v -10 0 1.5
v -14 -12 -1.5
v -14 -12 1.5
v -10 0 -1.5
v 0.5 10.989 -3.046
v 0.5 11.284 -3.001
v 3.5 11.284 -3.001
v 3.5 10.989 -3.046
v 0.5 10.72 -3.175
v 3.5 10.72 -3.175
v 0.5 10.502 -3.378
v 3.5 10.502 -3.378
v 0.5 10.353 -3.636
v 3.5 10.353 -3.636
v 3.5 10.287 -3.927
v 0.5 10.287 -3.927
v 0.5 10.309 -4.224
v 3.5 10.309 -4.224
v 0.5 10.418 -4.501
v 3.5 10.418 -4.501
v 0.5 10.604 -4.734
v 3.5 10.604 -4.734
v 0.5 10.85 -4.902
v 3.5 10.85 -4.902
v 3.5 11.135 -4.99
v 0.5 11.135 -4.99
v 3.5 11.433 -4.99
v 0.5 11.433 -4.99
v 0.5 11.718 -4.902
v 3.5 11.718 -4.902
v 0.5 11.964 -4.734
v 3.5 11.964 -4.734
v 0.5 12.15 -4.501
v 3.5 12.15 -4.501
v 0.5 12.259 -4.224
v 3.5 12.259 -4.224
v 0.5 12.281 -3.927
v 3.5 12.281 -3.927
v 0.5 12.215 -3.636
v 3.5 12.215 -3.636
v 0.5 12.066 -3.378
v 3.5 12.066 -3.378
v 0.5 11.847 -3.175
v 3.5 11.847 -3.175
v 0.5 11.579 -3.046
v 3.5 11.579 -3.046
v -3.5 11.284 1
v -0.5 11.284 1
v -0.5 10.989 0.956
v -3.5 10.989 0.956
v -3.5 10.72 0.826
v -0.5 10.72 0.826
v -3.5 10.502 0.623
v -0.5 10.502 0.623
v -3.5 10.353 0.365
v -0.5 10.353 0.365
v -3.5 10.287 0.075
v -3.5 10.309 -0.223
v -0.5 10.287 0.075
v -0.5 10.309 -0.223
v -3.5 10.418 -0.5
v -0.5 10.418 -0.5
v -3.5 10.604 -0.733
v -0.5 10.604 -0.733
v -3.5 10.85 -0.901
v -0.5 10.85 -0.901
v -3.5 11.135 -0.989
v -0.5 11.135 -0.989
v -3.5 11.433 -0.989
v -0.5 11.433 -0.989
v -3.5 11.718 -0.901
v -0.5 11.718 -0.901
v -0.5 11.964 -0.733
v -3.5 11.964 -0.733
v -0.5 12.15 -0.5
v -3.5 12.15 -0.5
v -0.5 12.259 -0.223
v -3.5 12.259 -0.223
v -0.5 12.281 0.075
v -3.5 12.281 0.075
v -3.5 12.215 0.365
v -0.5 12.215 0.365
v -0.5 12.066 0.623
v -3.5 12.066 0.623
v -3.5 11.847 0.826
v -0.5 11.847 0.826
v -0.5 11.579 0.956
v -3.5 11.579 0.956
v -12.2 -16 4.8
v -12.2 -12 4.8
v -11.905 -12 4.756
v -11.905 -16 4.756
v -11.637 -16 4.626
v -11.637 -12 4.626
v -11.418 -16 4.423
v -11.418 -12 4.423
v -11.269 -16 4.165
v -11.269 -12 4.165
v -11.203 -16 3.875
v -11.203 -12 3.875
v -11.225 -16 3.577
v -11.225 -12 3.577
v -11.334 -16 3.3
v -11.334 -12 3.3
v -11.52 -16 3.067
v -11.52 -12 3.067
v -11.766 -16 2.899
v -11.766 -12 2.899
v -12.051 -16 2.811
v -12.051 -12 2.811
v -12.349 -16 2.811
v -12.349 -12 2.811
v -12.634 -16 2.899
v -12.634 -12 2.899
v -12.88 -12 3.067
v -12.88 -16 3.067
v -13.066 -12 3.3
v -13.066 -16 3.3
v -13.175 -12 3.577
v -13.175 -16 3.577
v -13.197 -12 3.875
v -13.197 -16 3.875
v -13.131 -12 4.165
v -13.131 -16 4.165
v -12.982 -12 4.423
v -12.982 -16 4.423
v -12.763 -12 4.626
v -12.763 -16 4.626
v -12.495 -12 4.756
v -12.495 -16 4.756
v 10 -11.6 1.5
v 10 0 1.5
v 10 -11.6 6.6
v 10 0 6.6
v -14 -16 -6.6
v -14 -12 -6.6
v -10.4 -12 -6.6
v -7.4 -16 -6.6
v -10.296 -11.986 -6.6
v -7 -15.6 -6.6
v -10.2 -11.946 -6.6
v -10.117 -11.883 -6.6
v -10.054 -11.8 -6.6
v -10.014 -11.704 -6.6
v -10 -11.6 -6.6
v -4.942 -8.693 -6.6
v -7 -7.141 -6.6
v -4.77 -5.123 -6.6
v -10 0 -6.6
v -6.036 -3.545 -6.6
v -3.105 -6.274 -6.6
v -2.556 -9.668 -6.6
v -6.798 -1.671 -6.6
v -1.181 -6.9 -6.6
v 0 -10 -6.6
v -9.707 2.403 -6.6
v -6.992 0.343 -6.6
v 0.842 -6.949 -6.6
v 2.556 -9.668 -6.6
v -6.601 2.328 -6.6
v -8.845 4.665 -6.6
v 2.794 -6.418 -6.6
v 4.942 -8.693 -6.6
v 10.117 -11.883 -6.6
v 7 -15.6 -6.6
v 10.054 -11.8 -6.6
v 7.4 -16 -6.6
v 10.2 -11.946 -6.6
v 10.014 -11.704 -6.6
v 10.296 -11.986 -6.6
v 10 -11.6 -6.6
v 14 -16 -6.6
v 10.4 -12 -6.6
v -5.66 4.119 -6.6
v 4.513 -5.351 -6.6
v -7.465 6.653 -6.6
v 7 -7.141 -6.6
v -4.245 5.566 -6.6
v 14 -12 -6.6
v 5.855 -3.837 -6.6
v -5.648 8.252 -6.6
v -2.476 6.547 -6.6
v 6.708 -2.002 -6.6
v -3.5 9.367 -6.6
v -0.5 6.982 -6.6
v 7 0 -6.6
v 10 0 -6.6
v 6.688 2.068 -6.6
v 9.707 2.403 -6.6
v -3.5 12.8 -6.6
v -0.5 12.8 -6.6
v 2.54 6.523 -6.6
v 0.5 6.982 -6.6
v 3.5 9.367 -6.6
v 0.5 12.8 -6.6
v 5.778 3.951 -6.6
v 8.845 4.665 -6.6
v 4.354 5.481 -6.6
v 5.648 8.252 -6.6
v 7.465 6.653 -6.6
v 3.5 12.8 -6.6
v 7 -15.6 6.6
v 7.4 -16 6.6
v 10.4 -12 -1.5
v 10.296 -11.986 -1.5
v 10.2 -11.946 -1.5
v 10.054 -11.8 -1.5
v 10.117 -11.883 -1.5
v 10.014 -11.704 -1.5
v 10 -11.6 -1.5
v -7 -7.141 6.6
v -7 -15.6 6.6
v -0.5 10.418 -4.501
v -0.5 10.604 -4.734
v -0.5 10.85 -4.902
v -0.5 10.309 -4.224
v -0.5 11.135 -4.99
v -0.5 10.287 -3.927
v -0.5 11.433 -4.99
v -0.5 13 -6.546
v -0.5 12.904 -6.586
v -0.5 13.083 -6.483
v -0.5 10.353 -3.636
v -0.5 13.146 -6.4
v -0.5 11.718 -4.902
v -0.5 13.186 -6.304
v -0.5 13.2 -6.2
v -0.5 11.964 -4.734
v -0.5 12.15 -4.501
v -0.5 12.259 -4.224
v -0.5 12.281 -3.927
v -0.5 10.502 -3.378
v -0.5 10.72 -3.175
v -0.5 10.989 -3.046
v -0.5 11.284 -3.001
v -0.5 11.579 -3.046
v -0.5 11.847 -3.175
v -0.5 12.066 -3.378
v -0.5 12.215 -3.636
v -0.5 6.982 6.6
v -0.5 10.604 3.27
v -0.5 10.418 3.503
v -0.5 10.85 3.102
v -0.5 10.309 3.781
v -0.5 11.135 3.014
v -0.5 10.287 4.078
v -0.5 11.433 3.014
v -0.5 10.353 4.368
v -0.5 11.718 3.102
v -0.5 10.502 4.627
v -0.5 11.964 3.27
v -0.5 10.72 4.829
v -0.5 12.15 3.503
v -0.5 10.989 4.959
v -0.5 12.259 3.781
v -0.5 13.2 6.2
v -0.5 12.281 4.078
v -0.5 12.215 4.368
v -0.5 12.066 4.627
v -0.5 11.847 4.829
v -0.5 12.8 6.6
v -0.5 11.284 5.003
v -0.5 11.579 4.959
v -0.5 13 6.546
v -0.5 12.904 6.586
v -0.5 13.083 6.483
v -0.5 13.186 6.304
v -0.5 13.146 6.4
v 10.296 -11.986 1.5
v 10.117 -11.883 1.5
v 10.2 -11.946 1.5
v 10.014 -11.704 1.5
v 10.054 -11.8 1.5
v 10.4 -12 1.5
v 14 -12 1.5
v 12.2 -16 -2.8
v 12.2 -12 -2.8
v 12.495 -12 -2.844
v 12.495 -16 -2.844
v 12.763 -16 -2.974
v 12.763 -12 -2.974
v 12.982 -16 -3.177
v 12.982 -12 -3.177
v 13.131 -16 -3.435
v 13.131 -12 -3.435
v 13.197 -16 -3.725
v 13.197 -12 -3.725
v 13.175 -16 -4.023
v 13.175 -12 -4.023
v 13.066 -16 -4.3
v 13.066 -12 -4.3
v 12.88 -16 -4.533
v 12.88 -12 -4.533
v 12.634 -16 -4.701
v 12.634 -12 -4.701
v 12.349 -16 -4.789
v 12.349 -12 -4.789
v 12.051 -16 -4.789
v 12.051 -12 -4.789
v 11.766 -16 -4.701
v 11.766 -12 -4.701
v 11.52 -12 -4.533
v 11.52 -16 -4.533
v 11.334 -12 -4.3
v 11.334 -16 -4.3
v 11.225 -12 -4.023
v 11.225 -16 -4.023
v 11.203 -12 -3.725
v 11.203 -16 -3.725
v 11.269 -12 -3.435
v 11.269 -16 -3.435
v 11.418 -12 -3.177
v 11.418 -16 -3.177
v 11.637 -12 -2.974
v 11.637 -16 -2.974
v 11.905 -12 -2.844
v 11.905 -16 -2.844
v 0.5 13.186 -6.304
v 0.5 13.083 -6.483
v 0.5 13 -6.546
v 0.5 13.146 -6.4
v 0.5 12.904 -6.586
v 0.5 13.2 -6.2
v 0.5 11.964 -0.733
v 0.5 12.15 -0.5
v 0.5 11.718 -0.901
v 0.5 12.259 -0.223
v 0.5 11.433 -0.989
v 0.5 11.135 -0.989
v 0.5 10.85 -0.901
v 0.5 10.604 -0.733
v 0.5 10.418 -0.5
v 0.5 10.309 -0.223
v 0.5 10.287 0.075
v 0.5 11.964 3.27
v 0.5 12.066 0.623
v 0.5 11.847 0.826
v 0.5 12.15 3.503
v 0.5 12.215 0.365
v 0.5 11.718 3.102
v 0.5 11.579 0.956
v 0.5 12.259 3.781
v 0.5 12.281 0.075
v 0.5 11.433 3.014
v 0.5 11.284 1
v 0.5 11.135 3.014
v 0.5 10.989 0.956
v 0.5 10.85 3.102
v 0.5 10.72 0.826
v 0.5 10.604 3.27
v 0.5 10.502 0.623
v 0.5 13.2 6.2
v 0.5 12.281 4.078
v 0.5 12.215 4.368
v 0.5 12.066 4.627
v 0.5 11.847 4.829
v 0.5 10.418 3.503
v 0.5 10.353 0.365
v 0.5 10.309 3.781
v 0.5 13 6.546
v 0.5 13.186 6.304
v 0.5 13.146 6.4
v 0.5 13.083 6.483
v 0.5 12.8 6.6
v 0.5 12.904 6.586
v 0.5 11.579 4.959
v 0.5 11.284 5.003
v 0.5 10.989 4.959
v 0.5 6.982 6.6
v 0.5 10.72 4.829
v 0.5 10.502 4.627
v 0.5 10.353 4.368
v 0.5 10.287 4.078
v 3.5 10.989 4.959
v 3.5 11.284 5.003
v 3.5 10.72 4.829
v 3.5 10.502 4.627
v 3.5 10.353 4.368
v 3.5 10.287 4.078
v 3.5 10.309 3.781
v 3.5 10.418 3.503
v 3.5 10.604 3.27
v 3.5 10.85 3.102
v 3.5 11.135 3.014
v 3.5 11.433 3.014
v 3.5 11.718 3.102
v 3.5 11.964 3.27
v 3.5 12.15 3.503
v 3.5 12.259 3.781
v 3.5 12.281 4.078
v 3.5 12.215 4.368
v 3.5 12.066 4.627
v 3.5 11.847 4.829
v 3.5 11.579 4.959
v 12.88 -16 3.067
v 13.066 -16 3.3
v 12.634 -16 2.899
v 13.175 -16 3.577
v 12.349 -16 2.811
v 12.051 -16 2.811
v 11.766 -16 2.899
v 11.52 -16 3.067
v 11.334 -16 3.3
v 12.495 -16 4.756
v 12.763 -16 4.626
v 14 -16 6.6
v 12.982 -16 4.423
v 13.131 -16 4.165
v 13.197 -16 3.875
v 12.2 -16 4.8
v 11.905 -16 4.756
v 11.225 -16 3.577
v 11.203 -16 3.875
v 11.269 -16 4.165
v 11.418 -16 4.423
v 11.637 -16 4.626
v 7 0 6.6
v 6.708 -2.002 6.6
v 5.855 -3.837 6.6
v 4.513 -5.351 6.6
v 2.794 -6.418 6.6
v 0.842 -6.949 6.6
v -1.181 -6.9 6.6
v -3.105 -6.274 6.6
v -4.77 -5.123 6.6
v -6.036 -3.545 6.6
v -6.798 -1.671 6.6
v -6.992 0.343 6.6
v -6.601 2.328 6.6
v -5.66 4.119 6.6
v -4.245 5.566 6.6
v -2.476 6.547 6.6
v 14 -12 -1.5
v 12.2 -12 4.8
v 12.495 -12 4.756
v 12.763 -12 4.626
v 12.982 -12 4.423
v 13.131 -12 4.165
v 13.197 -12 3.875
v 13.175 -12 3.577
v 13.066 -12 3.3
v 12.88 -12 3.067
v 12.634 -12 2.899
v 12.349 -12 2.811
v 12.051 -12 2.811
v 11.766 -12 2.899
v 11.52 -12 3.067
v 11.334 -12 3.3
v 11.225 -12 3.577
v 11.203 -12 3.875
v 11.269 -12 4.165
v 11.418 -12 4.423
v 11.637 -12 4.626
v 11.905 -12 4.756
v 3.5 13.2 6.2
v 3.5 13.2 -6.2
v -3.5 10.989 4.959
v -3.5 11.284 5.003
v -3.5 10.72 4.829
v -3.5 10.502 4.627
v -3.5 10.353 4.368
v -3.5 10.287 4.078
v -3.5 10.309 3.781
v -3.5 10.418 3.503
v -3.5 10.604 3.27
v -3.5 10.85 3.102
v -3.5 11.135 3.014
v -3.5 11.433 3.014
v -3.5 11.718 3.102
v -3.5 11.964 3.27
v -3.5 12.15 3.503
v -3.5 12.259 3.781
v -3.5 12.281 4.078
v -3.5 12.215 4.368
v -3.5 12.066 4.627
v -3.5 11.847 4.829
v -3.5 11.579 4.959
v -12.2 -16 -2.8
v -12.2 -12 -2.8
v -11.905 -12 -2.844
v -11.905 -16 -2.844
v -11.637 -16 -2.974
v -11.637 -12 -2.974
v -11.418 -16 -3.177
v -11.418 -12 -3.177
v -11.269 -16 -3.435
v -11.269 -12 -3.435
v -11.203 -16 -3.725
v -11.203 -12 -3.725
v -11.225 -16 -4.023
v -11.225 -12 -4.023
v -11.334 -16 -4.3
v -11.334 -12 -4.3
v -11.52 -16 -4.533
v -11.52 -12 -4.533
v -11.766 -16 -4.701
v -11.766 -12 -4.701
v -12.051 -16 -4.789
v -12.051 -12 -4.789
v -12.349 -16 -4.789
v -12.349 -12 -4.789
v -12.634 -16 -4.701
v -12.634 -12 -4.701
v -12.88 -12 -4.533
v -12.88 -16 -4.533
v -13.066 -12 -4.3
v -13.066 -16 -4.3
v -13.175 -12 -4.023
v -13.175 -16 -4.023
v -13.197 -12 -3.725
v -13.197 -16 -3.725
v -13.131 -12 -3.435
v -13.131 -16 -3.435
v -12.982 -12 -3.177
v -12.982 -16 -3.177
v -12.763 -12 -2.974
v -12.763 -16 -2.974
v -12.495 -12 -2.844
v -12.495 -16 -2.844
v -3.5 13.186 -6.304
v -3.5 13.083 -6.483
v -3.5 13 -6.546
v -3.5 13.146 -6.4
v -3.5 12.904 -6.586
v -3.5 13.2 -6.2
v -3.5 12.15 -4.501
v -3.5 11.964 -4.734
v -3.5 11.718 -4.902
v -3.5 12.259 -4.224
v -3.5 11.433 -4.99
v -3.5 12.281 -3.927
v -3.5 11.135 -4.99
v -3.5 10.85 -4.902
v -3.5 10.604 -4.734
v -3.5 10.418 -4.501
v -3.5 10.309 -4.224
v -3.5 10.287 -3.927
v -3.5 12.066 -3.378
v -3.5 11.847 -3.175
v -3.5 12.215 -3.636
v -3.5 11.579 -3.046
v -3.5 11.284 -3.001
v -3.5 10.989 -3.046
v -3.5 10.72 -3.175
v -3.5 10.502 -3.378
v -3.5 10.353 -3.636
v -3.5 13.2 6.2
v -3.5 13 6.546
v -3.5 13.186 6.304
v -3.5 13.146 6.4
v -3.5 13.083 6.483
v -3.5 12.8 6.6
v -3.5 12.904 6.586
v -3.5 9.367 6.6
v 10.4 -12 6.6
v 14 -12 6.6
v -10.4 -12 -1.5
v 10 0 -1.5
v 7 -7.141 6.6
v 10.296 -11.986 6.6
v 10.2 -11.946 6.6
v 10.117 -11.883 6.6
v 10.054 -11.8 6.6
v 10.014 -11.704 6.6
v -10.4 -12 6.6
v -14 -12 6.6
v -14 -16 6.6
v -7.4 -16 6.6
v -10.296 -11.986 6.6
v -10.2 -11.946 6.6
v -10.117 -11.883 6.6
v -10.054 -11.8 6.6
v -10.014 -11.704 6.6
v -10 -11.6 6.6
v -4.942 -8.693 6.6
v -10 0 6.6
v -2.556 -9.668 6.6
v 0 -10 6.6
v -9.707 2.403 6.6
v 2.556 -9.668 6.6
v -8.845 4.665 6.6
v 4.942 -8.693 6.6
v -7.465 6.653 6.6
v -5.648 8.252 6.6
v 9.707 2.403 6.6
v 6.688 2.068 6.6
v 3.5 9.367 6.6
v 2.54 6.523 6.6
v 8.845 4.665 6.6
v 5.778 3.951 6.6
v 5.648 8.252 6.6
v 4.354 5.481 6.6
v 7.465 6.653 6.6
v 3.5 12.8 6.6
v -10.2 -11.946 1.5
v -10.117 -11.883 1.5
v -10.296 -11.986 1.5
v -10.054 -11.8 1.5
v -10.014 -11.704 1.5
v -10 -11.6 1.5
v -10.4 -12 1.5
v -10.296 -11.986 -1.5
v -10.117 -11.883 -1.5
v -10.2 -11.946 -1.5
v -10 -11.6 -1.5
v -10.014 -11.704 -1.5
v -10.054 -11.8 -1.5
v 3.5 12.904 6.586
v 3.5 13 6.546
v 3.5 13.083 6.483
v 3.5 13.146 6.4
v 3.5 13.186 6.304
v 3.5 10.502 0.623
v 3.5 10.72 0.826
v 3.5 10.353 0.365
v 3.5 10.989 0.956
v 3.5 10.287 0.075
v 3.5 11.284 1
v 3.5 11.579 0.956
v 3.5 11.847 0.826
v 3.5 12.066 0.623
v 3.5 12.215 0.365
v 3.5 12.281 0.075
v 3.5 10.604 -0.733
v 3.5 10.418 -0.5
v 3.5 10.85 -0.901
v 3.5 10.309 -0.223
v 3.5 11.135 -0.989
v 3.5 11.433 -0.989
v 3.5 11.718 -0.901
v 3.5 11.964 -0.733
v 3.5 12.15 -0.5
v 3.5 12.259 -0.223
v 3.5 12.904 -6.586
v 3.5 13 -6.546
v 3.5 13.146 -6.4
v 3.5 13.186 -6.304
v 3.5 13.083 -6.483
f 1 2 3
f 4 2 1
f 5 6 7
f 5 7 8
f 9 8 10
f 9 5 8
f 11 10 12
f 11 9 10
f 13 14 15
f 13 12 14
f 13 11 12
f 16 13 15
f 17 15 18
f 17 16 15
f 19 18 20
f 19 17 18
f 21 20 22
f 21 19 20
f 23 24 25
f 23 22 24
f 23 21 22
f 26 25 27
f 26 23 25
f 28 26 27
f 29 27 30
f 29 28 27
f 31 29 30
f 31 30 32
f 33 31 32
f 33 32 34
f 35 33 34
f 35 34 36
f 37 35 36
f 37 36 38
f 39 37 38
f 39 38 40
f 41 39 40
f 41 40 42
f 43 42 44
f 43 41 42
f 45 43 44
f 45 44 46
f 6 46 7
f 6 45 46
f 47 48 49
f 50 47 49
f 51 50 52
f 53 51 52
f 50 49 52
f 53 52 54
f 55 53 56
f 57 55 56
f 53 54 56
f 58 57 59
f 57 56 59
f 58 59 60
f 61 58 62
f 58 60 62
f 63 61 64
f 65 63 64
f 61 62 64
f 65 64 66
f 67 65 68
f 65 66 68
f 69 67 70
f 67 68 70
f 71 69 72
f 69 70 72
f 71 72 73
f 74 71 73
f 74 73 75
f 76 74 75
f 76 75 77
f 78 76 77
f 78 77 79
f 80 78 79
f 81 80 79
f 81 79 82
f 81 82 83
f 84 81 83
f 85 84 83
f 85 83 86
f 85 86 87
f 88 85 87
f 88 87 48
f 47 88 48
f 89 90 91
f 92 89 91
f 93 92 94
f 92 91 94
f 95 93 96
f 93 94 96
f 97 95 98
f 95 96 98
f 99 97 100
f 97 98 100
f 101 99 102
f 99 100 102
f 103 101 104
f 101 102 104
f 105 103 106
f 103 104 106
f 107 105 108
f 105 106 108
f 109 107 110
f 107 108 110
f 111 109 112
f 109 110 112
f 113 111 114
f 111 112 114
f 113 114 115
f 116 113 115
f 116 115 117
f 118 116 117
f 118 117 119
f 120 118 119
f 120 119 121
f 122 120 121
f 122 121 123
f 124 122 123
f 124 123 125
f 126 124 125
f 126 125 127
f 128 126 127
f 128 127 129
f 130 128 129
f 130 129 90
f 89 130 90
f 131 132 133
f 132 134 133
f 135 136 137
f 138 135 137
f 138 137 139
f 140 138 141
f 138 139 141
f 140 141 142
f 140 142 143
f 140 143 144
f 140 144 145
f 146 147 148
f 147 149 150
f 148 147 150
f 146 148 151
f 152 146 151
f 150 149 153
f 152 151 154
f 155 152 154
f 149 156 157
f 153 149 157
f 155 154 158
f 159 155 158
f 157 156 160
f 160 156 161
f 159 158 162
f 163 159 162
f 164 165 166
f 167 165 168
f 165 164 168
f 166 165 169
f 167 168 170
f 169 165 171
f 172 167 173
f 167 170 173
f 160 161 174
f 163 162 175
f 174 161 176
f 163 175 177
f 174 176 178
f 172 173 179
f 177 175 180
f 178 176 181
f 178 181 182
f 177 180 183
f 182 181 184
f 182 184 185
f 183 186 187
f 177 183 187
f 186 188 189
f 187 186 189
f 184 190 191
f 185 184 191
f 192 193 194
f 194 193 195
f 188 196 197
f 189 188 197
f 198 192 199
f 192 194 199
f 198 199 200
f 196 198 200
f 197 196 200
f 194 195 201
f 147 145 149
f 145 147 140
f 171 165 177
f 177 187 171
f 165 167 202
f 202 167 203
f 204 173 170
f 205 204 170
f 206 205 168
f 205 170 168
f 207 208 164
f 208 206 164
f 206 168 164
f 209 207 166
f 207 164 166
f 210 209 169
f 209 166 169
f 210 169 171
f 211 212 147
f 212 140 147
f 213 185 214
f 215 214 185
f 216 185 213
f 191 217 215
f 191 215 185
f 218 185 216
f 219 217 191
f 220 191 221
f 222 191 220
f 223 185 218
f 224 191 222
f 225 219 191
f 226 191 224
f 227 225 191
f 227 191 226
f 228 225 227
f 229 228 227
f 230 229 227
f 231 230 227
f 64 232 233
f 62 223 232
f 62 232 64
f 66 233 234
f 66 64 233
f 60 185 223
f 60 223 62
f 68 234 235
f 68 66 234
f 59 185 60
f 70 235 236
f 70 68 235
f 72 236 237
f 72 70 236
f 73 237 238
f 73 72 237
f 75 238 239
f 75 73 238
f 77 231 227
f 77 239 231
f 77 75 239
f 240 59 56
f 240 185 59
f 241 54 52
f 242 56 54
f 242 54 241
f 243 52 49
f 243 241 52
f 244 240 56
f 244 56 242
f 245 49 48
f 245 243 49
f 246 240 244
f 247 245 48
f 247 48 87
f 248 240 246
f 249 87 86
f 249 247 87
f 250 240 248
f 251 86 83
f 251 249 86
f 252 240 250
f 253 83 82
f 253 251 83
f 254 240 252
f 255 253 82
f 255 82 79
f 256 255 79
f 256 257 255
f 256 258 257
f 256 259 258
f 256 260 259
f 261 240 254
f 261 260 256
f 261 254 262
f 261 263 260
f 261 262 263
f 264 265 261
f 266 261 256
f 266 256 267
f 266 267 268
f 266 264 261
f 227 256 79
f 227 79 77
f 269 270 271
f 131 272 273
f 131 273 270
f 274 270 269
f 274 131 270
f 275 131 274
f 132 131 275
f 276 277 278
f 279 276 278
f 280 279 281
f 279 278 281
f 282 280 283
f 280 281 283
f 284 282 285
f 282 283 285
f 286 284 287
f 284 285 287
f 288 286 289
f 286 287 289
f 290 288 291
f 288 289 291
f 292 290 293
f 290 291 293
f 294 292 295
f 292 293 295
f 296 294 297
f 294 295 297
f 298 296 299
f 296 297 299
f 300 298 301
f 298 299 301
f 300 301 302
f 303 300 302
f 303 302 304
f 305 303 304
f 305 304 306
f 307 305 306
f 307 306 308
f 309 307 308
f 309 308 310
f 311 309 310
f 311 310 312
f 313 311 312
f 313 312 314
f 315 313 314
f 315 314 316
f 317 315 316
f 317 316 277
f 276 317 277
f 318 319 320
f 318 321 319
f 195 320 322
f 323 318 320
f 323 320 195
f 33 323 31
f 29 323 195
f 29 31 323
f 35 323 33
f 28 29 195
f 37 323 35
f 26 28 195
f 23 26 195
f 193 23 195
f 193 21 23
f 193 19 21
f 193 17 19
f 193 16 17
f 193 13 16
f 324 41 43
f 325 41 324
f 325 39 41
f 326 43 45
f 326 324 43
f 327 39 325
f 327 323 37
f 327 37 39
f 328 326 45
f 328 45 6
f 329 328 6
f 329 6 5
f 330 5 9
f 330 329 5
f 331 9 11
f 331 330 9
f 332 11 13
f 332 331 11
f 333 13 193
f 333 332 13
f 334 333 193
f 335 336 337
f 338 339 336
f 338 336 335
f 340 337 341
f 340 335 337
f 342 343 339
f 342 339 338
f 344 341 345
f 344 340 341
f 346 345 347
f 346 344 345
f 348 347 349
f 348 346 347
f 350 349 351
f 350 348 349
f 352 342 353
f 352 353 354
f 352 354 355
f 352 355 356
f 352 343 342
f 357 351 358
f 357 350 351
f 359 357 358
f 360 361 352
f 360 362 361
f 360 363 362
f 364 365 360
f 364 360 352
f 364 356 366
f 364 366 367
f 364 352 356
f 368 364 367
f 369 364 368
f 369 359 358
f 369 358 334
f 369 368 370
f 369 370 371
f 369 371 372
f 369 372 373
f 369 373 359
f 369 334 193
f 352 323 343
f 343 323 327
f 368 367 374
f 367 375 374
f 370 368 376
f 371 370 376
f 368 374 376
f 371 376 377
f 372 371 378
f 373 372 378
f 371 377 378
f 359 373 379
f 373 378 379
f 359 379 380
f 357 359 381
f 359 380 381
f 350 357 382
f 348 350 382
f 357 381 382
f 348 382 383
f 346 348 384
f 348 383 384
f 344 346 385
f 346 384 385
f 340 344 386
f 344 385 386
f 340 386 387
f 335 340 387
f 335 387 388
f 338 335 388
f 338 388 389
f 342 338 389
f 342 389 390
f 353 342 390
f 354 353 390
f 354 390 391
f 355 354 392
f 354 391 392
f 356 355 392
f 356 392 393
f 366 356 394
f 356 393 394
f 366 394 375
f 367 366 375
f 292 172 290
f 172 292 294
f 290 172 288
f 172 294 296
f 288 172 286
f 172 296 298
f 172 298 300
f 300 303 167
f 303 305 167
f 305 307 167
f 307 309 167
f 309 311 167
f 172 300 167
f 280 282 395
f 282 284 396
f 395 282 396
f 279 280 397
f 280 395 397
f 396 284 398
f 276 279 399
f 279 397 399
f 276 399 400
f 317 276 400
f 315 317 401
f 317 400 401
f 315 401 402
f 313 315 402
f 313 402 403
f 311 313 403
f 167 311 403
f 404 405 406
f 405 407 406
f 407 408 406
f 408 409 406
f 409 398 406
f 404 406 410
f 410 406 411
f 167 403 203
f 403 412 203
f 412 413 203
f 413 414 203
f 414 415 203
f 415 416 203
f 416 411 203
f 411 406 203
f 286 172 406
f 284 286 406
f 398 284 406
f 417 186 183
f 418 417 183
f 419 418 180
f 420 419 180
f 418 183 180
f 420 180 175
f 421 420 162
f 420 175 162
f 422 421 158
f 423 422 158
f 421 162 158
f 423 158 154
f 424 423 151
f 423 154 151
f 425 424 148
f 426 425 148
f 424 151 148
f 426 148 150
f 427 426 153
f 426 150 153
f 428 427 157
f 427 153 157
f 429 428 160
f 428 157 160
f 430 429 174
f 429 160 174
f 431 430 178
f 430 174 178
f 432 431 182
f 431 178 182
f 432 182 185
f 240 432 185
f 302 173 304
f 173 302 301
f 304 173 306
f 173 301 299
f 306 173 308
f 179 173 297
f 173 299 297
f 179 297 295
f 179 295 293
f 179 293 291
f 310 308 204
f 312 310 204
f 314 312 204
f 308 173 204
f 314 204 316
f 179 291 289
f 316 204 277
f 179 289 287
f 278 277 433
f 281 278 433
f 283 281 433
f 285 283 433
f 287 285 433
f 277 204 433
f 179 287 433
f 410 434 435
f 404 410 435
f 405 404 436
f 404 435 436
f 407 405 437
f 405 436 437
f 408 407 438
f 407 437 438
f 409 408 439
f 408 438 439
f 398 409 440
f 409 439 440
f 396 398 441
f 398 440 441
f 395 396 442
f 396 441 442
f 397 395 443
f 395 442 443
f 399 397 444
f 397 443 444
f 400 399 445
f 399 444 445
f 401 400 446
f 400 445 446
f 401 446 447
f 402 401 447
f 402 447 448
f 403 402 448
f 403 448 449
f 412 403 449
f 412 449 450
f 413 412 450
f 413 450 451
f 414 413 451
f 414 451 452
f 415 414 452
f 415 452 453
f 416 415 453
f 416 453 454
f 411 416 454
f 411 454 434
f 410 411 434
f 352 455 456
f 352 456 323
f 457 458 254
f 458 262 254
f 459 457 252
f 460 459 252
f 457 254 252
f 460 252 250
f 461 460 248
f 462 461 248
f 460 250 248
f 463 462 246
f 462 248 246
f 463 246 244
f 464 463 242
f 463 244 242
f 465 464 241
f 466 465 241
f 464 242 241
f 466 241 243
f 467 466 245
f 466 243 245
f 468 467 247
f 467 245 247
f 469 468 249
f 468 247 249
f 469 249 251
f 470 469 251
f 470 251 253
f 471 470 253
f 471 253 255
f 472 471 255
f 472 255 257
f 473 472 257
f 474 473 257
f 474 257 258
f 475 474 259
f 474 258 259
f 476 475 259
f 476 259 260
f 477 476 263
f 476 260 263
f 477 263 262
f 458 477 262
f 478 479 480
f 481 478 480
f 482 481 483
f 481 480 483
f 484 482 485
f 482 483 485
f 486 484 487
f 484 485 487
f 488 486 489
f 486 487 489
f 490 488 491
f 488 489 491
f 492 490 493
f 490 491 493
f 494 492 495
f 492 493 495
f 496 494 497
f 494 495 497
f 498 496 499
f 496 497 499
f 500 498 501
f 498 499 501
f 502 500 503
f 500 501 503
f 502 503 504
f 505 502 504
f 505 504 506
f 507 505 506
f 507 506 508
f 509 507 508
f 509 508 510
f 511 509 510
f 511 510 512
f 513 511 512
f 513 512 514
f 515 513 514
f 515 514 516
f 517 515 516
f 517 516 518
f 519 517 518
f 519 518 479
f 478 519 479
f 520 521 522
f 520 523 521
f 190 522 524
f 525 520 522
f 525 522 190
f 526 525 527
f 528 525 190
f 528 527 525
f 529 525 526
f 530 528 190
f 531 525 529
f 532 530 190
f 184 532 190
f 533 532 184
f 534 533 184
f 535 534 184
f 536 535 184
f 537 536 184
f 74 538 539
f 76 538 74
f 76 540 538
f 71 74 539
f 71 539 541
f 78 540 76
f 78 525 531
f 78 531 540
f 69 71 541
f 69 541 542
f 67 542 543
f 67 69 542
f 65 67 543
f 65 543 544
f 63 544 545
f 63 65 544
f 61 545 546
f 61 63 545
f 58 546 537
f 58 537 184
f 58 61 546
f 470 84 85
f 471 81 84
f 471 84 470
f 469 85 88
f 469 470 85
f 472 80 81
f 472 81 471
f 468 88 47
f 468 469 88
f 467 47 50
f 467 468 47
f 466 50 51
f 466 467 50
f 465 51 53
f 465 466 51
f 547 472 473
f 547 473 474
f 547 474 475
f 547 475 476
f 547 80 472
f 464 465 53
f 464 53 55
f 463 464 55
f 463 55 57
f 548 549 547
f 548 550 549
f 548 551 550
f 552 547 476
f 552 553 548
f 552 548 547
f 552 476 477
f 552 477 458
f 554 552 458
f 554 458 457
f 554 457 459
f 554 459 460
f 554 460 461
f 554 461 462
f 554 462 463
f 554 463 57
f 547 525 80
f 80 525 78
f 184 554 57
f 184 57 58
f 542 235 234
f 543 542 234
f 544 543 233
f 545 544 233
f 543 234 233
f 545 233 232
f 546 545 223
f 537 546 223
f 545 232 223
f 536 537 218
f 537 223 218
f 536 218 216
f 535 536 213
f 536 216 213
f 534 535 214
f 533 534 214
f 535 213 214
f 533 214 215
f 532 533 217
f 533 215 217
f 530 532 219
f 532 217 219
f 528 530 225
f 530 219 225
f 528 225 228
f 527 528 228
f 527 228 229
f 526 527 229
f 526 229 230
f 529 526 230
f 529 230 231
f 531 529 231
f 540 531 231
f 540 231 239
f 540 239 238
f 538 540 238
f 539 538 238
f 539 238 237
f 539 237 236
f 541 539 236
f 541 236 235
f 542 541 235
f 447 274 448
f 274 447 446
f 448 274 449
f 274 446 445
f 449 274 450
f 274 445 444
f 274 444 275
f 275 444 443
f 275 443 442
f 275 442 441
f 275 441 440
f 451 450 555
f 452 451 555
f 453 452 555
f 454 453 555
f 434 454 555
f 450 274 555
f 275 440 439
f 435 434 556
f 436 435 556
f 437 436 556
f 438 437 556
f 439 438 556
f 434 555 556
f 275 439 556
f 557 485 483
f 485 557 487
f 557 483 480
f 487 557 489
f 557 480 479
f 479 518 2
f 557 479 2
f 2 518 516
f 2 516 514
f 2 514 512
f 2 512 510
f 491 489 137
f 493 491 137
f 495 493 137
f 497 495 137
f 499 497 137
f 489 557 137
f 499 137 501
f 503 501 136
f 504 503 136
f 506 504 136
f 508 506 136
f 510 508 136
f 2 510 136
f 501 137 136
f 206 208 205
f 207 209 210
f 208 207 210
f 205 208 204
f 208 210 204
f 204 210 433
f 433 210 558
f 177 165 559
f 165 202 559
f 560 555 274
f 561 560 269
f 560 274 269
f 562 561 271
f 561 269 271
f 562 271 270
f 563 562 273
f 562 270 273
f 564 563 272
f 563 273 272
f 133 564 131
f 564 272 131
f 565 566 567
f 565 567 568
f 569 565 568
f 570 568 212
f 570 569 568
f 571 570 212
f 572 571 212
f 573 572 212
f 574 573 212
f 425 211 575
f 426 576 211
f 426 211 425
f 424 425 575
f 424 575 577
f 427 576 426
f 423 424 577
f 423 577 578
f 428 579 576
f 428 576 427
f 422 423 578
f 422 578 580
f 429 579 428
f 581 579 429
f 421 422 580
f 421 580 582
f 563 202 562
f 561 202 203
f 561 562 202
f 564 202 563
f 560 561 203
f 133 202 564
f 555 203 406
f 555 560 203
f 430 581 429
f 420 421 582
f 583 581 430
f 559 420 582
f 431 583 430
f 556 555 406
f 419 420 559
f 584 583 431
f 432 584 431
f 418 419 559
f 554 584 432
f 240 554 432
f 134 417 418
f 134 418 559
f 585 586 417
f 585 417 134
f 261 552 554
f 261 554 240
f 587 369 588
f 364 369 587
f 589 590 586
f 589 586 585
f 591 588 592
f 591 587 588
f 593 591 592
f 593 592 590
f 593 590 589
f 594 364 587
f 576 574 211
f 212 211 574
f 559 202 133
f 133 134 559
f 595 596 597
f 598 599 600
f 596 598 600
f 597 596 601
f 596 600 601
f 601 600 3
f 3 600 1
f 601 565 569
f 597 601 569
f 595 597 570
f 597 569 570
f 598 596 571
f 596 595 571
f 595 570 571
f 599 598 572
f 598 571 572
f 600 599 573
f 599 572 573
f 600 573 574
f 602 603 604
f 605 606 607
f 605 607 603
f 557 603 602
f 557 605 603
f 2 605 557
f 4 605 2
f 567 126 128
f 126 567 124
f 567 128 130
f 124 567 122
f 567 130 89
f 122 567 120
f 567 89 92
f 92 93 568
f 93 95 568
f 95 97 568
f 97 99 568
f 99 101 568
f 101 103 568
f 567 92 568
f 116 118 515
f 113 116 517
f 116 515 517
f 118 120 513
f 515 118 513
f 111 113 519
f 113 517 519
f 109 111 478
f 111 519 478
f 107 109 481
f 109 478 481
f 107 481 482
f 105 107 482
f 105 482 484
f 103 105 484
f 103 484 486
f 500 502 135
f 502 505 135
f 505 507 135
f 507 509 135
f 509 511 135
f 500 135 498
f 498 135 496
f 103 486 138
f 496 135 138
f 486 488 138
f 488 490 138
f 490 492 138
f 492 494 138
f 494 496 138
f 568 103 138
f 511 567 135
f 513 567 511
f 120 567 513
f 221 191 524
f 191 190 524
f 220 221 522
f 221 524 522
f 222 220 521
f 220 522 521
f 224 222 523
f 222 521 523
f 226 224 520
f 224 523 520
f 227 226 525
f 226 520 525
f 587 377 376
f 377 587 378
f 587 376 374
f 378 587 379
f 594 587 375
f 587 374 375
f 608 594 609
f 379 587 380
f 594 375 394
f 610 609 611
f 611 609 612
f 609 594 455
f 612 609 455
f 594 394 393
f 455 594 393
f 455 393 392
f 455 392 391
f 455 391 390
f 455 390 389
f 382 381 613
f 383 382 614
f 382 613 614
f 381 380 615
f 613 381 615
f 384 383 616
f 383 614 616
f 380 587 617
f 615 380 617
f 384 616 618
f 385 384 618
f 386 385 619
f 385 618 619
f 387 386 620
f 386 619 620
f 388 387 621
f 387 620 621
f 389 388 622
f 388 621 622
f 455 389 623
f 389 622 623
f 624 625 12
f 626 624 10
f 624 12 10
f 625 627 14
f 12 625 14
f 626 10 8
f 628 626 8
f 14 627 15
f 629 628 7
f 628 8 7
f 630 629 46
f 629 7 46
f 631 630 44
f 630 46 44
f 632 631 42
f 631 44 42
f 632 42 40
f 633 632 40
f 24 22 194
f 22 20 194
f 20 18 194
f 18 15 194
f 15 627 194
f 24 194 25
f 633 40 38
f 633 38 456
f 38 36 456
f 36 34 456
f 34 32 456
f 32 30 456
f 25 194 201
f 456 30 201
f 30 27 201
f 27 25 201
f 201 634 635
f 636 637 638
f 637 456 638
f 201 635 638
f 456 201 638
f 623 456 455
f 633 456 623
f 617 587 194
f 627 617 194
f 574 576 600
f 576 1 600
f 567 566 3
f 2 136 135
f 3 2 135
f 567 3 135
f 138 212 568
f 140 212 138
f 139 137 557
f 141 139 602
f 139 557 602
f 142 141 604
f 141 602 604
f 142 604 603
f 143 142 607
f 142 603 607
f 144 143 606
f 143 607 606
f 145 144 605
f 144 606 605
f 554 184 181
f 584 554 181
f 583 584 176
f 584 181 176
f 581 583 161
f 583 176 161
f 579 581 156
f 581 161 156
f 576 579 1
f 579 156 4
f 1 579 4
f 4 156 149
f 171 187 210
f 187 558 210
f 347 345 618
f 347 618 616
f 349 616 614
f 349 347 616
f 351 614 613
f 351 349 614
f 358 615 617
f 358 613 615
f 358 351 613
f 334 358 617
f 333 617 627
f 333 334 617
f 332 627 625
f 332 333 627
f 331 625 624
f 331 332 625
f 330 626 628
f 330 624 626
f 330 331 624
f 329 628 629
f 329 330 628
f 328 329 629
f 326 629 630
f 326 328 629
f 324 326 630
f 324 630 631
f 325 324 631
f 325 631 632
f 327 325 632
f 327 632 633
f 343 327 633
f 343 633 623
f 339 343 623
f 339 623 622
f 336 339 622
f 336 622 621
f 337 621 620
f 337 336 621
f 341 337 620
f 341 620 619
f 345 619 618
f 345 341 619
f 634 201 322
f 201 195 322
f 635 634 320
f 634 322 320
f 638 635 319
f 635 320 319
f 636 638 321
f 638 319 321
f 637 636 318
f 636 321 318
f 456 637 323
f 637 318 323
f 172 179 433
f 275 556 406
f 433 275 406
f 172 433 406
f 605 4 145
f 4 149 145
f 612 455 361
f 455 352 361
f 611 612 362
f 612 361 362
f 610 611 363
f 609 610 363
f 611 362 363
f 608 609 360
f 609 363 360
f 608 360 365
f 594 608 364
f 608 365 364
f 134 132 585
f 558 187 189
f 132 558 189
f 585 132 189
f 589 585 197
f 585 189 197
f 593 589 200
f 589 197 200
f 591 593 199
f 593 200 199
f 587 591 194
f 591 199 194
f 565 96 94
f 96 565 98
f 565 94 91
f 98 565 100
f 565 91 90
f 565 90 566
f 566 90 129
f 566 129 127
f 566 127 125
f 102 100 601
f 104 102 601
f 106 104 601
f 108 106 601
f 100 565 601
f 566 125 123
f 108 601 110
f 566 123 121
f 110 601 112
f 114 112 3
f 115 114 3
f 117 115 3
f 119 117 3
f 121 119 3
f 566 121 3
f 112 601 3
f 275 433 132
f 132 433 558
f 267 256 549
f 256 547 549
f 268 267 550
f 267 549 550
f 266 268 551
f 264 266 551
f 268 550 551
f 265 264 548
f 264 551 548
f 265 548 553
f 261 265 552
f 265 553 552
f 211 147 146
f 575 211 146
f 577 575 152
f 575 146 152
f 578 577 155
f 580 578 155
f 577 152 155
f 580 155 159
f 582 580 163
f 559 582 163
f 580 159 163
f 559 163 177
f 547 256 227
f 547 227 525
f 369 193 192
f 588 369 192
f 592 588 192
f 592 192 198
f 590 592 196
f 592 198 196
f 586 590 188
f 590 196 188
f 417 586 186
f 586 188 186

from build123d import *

# Parameters (mm, degrees)
BOSS_EXTRUDE1_DEPTH = 6.6
SKETCH3_R           = 1
CUT_EXTRUDE1_DEPTH  = 6.6
BOSS_EXTRUDE2_DEPTH = 6.6
CHAMFER1_SIZE       = 0.4
FILLET1_R           = 0.4
FILLET2_R           = 0.4
RIB17_START         = -1.5
RIB17_DEPTH         = 3
SKETCH25_R          = 1
CUT_EXTRUDE2_DEPTH  = 13.2


# Read off the part's stored shape, not the designer's step: Rib17
with BuildPart() as part:
    # Sketch1 → Boss-Extrude1 (new, symmetric)
    with BuildSketch(Plane.XY):
        with BuildLine():
            Line((-0.5, 13.2), (-3.5, 13.2))
            Line((-3.5, 13.2), (-3.5, 9.367496998))
            ThreePointArc((-3.5, 9.367496998), (0, -10), (3.5, 9.367496998))
            Line((3.5, 9.367496998), (3.5, 13.2))
            Line((3.5, 13.2), (0.5, 13.2))
            Line((0.5, 13.2), (0.5, 6.982120022))
            ThreePointArc((0.5, 6.982120022), (5.123475383, 4.769696007), (7, 0))
            ThreePointArc((7, 0), (-4.769696007, -5.123475383), (-0.5, 6.982120022))
            Line((-0.5, 6.982120022), (-0.5, 13.2))
        make_face()
    extrude(amount=BOSS_EXTRUDE1_DEPTH, both=True)

    # Sketch3 → Cut-Extrude1 (cut, symmetric)
    with BuildSketch(Plane(origin=(0, 0, 0), x_dir=(0, 0, -1), z_dir=(1, 0, 0))):
        with Locations(Location((0, 11.283748499, 0), (0, 0, 180))):
            Circle(SKETCH3_R)
        with Locations(Location((4.001379793, 11.283748499, 0), (0, 0, 180))):
            Circle(SKETCH3_R)
        with Locations(Location((-4.00303992, 11.283748499, 0), (0, 0, 180))):
            Circle(SKETCH3_R)
    extrude(amount=CUT_EXTRUDE1_DEPTH, both=True, mode=Mode.SUBTRACT)

    # Sketch4 → Boss-Extrude2 (add, symmetric)
    with BuildSketch(Plane.XY):
        with BuildLine():
            Line((-10, 0), (-10, -12))
            Line((-10, -12), (-14, -12))
            Line((-14, -12), (-14, -16))
            Line((-14, -16), (-7, -16))
            Line((-7, -16), (-7, -7.141428429))
            ThreePointArc((-7, -7.141428429), (-9.219544457, -3.872983346), (-10, 0))
        make_face()
        with BuildLine():
            Line((10, 0), (10, -12))
            Line((10, -12), (14, -12))
            Line((14, -12), (14, -16))
            Line((14, -16), (7, -16))
            Line((7, -16), (7, -7.141428429))
            ThreePointArc((7, -7.141428429), (9.219544457, -3.872983346), (10, 0))
        make_face()
    extrude(amount=BOSS_EXTRUDE2_DEPTH, both=True)

    # Chamfer1
    chamfer1_edges = [part.edges().sort_by_distance(p)[0] for p in [
        (-7, -16, 0),
        (7, -16, 0),
    ]]
    chamfer(chamfer1_edges, length=CHAMFER1_SIZE)

    # Fillet1
    fillet1_edges = [part.edges().sort_by_distance(p)[0] for p in [
        (-10, -12, 0),
        (10, -12, 0),
    ]]
    fillet(fillet1_edges, radius=FILLET1_R)

    # Fillet2
    fillet2_edges = [part.edges().sort_by_distance(p)[0] for p in [
        (2, 13.2, -6.6),
        (-2, 13.2, -6.6),
        (-2, 13.2, 6.6),
        (2, 13.2, 6.6),
    ]]
    fillet(fillet2_edges, radius=FILLET2_R)

    # Rib17 outline → Rib17 (add)
    with BuildSketch(Plane.XY.offset(RIB17_START)):
        with BuildLine():
            Line((14, -12), (10, 0))
            Line((10, 0), (10, -11.6))
            ThreePointArc((10, -11.6), (10.117157288, -11.882842712), (10.4, -12))
            Line((10.4, -12), (14, -12))
        make_face()
    rib17 = extrude(amount=RIB17_DEPTH)

    # Mirror1: Rib17 across plane
    add(rib17.mirror(Plane(origin=(0, 0, 0), x_dir=(0, 0, 1), z_dir=(1, 0, 0))))

    # Sketch25 → Cut-Extrude2 (cut)
    with BuildSketch(Plane(origin=(0, -12, 0), x_dir=(1, 0, 0), z_dir=(0, 1, 0))):
        with Locations(Location((-12.2, 3.8, 0), (0, 0, 270))):
            Circle(SKETCH25_R)
        with Locations(Location((-12.2, -3.8, 0), (0, 0, 270))):
            Circle(SKETCH25_R)
        with Locations(Location((12.2, 3.8, 0), (0, 0, 270))):
            Circle(SKETCH25_R)
        with Locations(Location((12.2, -3.8, 0), (0, 0, 270))):
            Circle(SKETCH25_R)
    extrude(amount=-CUT_EXTRUDE2_DEPTH, mode=Mode.SUBTRACT)


solid = part.part
